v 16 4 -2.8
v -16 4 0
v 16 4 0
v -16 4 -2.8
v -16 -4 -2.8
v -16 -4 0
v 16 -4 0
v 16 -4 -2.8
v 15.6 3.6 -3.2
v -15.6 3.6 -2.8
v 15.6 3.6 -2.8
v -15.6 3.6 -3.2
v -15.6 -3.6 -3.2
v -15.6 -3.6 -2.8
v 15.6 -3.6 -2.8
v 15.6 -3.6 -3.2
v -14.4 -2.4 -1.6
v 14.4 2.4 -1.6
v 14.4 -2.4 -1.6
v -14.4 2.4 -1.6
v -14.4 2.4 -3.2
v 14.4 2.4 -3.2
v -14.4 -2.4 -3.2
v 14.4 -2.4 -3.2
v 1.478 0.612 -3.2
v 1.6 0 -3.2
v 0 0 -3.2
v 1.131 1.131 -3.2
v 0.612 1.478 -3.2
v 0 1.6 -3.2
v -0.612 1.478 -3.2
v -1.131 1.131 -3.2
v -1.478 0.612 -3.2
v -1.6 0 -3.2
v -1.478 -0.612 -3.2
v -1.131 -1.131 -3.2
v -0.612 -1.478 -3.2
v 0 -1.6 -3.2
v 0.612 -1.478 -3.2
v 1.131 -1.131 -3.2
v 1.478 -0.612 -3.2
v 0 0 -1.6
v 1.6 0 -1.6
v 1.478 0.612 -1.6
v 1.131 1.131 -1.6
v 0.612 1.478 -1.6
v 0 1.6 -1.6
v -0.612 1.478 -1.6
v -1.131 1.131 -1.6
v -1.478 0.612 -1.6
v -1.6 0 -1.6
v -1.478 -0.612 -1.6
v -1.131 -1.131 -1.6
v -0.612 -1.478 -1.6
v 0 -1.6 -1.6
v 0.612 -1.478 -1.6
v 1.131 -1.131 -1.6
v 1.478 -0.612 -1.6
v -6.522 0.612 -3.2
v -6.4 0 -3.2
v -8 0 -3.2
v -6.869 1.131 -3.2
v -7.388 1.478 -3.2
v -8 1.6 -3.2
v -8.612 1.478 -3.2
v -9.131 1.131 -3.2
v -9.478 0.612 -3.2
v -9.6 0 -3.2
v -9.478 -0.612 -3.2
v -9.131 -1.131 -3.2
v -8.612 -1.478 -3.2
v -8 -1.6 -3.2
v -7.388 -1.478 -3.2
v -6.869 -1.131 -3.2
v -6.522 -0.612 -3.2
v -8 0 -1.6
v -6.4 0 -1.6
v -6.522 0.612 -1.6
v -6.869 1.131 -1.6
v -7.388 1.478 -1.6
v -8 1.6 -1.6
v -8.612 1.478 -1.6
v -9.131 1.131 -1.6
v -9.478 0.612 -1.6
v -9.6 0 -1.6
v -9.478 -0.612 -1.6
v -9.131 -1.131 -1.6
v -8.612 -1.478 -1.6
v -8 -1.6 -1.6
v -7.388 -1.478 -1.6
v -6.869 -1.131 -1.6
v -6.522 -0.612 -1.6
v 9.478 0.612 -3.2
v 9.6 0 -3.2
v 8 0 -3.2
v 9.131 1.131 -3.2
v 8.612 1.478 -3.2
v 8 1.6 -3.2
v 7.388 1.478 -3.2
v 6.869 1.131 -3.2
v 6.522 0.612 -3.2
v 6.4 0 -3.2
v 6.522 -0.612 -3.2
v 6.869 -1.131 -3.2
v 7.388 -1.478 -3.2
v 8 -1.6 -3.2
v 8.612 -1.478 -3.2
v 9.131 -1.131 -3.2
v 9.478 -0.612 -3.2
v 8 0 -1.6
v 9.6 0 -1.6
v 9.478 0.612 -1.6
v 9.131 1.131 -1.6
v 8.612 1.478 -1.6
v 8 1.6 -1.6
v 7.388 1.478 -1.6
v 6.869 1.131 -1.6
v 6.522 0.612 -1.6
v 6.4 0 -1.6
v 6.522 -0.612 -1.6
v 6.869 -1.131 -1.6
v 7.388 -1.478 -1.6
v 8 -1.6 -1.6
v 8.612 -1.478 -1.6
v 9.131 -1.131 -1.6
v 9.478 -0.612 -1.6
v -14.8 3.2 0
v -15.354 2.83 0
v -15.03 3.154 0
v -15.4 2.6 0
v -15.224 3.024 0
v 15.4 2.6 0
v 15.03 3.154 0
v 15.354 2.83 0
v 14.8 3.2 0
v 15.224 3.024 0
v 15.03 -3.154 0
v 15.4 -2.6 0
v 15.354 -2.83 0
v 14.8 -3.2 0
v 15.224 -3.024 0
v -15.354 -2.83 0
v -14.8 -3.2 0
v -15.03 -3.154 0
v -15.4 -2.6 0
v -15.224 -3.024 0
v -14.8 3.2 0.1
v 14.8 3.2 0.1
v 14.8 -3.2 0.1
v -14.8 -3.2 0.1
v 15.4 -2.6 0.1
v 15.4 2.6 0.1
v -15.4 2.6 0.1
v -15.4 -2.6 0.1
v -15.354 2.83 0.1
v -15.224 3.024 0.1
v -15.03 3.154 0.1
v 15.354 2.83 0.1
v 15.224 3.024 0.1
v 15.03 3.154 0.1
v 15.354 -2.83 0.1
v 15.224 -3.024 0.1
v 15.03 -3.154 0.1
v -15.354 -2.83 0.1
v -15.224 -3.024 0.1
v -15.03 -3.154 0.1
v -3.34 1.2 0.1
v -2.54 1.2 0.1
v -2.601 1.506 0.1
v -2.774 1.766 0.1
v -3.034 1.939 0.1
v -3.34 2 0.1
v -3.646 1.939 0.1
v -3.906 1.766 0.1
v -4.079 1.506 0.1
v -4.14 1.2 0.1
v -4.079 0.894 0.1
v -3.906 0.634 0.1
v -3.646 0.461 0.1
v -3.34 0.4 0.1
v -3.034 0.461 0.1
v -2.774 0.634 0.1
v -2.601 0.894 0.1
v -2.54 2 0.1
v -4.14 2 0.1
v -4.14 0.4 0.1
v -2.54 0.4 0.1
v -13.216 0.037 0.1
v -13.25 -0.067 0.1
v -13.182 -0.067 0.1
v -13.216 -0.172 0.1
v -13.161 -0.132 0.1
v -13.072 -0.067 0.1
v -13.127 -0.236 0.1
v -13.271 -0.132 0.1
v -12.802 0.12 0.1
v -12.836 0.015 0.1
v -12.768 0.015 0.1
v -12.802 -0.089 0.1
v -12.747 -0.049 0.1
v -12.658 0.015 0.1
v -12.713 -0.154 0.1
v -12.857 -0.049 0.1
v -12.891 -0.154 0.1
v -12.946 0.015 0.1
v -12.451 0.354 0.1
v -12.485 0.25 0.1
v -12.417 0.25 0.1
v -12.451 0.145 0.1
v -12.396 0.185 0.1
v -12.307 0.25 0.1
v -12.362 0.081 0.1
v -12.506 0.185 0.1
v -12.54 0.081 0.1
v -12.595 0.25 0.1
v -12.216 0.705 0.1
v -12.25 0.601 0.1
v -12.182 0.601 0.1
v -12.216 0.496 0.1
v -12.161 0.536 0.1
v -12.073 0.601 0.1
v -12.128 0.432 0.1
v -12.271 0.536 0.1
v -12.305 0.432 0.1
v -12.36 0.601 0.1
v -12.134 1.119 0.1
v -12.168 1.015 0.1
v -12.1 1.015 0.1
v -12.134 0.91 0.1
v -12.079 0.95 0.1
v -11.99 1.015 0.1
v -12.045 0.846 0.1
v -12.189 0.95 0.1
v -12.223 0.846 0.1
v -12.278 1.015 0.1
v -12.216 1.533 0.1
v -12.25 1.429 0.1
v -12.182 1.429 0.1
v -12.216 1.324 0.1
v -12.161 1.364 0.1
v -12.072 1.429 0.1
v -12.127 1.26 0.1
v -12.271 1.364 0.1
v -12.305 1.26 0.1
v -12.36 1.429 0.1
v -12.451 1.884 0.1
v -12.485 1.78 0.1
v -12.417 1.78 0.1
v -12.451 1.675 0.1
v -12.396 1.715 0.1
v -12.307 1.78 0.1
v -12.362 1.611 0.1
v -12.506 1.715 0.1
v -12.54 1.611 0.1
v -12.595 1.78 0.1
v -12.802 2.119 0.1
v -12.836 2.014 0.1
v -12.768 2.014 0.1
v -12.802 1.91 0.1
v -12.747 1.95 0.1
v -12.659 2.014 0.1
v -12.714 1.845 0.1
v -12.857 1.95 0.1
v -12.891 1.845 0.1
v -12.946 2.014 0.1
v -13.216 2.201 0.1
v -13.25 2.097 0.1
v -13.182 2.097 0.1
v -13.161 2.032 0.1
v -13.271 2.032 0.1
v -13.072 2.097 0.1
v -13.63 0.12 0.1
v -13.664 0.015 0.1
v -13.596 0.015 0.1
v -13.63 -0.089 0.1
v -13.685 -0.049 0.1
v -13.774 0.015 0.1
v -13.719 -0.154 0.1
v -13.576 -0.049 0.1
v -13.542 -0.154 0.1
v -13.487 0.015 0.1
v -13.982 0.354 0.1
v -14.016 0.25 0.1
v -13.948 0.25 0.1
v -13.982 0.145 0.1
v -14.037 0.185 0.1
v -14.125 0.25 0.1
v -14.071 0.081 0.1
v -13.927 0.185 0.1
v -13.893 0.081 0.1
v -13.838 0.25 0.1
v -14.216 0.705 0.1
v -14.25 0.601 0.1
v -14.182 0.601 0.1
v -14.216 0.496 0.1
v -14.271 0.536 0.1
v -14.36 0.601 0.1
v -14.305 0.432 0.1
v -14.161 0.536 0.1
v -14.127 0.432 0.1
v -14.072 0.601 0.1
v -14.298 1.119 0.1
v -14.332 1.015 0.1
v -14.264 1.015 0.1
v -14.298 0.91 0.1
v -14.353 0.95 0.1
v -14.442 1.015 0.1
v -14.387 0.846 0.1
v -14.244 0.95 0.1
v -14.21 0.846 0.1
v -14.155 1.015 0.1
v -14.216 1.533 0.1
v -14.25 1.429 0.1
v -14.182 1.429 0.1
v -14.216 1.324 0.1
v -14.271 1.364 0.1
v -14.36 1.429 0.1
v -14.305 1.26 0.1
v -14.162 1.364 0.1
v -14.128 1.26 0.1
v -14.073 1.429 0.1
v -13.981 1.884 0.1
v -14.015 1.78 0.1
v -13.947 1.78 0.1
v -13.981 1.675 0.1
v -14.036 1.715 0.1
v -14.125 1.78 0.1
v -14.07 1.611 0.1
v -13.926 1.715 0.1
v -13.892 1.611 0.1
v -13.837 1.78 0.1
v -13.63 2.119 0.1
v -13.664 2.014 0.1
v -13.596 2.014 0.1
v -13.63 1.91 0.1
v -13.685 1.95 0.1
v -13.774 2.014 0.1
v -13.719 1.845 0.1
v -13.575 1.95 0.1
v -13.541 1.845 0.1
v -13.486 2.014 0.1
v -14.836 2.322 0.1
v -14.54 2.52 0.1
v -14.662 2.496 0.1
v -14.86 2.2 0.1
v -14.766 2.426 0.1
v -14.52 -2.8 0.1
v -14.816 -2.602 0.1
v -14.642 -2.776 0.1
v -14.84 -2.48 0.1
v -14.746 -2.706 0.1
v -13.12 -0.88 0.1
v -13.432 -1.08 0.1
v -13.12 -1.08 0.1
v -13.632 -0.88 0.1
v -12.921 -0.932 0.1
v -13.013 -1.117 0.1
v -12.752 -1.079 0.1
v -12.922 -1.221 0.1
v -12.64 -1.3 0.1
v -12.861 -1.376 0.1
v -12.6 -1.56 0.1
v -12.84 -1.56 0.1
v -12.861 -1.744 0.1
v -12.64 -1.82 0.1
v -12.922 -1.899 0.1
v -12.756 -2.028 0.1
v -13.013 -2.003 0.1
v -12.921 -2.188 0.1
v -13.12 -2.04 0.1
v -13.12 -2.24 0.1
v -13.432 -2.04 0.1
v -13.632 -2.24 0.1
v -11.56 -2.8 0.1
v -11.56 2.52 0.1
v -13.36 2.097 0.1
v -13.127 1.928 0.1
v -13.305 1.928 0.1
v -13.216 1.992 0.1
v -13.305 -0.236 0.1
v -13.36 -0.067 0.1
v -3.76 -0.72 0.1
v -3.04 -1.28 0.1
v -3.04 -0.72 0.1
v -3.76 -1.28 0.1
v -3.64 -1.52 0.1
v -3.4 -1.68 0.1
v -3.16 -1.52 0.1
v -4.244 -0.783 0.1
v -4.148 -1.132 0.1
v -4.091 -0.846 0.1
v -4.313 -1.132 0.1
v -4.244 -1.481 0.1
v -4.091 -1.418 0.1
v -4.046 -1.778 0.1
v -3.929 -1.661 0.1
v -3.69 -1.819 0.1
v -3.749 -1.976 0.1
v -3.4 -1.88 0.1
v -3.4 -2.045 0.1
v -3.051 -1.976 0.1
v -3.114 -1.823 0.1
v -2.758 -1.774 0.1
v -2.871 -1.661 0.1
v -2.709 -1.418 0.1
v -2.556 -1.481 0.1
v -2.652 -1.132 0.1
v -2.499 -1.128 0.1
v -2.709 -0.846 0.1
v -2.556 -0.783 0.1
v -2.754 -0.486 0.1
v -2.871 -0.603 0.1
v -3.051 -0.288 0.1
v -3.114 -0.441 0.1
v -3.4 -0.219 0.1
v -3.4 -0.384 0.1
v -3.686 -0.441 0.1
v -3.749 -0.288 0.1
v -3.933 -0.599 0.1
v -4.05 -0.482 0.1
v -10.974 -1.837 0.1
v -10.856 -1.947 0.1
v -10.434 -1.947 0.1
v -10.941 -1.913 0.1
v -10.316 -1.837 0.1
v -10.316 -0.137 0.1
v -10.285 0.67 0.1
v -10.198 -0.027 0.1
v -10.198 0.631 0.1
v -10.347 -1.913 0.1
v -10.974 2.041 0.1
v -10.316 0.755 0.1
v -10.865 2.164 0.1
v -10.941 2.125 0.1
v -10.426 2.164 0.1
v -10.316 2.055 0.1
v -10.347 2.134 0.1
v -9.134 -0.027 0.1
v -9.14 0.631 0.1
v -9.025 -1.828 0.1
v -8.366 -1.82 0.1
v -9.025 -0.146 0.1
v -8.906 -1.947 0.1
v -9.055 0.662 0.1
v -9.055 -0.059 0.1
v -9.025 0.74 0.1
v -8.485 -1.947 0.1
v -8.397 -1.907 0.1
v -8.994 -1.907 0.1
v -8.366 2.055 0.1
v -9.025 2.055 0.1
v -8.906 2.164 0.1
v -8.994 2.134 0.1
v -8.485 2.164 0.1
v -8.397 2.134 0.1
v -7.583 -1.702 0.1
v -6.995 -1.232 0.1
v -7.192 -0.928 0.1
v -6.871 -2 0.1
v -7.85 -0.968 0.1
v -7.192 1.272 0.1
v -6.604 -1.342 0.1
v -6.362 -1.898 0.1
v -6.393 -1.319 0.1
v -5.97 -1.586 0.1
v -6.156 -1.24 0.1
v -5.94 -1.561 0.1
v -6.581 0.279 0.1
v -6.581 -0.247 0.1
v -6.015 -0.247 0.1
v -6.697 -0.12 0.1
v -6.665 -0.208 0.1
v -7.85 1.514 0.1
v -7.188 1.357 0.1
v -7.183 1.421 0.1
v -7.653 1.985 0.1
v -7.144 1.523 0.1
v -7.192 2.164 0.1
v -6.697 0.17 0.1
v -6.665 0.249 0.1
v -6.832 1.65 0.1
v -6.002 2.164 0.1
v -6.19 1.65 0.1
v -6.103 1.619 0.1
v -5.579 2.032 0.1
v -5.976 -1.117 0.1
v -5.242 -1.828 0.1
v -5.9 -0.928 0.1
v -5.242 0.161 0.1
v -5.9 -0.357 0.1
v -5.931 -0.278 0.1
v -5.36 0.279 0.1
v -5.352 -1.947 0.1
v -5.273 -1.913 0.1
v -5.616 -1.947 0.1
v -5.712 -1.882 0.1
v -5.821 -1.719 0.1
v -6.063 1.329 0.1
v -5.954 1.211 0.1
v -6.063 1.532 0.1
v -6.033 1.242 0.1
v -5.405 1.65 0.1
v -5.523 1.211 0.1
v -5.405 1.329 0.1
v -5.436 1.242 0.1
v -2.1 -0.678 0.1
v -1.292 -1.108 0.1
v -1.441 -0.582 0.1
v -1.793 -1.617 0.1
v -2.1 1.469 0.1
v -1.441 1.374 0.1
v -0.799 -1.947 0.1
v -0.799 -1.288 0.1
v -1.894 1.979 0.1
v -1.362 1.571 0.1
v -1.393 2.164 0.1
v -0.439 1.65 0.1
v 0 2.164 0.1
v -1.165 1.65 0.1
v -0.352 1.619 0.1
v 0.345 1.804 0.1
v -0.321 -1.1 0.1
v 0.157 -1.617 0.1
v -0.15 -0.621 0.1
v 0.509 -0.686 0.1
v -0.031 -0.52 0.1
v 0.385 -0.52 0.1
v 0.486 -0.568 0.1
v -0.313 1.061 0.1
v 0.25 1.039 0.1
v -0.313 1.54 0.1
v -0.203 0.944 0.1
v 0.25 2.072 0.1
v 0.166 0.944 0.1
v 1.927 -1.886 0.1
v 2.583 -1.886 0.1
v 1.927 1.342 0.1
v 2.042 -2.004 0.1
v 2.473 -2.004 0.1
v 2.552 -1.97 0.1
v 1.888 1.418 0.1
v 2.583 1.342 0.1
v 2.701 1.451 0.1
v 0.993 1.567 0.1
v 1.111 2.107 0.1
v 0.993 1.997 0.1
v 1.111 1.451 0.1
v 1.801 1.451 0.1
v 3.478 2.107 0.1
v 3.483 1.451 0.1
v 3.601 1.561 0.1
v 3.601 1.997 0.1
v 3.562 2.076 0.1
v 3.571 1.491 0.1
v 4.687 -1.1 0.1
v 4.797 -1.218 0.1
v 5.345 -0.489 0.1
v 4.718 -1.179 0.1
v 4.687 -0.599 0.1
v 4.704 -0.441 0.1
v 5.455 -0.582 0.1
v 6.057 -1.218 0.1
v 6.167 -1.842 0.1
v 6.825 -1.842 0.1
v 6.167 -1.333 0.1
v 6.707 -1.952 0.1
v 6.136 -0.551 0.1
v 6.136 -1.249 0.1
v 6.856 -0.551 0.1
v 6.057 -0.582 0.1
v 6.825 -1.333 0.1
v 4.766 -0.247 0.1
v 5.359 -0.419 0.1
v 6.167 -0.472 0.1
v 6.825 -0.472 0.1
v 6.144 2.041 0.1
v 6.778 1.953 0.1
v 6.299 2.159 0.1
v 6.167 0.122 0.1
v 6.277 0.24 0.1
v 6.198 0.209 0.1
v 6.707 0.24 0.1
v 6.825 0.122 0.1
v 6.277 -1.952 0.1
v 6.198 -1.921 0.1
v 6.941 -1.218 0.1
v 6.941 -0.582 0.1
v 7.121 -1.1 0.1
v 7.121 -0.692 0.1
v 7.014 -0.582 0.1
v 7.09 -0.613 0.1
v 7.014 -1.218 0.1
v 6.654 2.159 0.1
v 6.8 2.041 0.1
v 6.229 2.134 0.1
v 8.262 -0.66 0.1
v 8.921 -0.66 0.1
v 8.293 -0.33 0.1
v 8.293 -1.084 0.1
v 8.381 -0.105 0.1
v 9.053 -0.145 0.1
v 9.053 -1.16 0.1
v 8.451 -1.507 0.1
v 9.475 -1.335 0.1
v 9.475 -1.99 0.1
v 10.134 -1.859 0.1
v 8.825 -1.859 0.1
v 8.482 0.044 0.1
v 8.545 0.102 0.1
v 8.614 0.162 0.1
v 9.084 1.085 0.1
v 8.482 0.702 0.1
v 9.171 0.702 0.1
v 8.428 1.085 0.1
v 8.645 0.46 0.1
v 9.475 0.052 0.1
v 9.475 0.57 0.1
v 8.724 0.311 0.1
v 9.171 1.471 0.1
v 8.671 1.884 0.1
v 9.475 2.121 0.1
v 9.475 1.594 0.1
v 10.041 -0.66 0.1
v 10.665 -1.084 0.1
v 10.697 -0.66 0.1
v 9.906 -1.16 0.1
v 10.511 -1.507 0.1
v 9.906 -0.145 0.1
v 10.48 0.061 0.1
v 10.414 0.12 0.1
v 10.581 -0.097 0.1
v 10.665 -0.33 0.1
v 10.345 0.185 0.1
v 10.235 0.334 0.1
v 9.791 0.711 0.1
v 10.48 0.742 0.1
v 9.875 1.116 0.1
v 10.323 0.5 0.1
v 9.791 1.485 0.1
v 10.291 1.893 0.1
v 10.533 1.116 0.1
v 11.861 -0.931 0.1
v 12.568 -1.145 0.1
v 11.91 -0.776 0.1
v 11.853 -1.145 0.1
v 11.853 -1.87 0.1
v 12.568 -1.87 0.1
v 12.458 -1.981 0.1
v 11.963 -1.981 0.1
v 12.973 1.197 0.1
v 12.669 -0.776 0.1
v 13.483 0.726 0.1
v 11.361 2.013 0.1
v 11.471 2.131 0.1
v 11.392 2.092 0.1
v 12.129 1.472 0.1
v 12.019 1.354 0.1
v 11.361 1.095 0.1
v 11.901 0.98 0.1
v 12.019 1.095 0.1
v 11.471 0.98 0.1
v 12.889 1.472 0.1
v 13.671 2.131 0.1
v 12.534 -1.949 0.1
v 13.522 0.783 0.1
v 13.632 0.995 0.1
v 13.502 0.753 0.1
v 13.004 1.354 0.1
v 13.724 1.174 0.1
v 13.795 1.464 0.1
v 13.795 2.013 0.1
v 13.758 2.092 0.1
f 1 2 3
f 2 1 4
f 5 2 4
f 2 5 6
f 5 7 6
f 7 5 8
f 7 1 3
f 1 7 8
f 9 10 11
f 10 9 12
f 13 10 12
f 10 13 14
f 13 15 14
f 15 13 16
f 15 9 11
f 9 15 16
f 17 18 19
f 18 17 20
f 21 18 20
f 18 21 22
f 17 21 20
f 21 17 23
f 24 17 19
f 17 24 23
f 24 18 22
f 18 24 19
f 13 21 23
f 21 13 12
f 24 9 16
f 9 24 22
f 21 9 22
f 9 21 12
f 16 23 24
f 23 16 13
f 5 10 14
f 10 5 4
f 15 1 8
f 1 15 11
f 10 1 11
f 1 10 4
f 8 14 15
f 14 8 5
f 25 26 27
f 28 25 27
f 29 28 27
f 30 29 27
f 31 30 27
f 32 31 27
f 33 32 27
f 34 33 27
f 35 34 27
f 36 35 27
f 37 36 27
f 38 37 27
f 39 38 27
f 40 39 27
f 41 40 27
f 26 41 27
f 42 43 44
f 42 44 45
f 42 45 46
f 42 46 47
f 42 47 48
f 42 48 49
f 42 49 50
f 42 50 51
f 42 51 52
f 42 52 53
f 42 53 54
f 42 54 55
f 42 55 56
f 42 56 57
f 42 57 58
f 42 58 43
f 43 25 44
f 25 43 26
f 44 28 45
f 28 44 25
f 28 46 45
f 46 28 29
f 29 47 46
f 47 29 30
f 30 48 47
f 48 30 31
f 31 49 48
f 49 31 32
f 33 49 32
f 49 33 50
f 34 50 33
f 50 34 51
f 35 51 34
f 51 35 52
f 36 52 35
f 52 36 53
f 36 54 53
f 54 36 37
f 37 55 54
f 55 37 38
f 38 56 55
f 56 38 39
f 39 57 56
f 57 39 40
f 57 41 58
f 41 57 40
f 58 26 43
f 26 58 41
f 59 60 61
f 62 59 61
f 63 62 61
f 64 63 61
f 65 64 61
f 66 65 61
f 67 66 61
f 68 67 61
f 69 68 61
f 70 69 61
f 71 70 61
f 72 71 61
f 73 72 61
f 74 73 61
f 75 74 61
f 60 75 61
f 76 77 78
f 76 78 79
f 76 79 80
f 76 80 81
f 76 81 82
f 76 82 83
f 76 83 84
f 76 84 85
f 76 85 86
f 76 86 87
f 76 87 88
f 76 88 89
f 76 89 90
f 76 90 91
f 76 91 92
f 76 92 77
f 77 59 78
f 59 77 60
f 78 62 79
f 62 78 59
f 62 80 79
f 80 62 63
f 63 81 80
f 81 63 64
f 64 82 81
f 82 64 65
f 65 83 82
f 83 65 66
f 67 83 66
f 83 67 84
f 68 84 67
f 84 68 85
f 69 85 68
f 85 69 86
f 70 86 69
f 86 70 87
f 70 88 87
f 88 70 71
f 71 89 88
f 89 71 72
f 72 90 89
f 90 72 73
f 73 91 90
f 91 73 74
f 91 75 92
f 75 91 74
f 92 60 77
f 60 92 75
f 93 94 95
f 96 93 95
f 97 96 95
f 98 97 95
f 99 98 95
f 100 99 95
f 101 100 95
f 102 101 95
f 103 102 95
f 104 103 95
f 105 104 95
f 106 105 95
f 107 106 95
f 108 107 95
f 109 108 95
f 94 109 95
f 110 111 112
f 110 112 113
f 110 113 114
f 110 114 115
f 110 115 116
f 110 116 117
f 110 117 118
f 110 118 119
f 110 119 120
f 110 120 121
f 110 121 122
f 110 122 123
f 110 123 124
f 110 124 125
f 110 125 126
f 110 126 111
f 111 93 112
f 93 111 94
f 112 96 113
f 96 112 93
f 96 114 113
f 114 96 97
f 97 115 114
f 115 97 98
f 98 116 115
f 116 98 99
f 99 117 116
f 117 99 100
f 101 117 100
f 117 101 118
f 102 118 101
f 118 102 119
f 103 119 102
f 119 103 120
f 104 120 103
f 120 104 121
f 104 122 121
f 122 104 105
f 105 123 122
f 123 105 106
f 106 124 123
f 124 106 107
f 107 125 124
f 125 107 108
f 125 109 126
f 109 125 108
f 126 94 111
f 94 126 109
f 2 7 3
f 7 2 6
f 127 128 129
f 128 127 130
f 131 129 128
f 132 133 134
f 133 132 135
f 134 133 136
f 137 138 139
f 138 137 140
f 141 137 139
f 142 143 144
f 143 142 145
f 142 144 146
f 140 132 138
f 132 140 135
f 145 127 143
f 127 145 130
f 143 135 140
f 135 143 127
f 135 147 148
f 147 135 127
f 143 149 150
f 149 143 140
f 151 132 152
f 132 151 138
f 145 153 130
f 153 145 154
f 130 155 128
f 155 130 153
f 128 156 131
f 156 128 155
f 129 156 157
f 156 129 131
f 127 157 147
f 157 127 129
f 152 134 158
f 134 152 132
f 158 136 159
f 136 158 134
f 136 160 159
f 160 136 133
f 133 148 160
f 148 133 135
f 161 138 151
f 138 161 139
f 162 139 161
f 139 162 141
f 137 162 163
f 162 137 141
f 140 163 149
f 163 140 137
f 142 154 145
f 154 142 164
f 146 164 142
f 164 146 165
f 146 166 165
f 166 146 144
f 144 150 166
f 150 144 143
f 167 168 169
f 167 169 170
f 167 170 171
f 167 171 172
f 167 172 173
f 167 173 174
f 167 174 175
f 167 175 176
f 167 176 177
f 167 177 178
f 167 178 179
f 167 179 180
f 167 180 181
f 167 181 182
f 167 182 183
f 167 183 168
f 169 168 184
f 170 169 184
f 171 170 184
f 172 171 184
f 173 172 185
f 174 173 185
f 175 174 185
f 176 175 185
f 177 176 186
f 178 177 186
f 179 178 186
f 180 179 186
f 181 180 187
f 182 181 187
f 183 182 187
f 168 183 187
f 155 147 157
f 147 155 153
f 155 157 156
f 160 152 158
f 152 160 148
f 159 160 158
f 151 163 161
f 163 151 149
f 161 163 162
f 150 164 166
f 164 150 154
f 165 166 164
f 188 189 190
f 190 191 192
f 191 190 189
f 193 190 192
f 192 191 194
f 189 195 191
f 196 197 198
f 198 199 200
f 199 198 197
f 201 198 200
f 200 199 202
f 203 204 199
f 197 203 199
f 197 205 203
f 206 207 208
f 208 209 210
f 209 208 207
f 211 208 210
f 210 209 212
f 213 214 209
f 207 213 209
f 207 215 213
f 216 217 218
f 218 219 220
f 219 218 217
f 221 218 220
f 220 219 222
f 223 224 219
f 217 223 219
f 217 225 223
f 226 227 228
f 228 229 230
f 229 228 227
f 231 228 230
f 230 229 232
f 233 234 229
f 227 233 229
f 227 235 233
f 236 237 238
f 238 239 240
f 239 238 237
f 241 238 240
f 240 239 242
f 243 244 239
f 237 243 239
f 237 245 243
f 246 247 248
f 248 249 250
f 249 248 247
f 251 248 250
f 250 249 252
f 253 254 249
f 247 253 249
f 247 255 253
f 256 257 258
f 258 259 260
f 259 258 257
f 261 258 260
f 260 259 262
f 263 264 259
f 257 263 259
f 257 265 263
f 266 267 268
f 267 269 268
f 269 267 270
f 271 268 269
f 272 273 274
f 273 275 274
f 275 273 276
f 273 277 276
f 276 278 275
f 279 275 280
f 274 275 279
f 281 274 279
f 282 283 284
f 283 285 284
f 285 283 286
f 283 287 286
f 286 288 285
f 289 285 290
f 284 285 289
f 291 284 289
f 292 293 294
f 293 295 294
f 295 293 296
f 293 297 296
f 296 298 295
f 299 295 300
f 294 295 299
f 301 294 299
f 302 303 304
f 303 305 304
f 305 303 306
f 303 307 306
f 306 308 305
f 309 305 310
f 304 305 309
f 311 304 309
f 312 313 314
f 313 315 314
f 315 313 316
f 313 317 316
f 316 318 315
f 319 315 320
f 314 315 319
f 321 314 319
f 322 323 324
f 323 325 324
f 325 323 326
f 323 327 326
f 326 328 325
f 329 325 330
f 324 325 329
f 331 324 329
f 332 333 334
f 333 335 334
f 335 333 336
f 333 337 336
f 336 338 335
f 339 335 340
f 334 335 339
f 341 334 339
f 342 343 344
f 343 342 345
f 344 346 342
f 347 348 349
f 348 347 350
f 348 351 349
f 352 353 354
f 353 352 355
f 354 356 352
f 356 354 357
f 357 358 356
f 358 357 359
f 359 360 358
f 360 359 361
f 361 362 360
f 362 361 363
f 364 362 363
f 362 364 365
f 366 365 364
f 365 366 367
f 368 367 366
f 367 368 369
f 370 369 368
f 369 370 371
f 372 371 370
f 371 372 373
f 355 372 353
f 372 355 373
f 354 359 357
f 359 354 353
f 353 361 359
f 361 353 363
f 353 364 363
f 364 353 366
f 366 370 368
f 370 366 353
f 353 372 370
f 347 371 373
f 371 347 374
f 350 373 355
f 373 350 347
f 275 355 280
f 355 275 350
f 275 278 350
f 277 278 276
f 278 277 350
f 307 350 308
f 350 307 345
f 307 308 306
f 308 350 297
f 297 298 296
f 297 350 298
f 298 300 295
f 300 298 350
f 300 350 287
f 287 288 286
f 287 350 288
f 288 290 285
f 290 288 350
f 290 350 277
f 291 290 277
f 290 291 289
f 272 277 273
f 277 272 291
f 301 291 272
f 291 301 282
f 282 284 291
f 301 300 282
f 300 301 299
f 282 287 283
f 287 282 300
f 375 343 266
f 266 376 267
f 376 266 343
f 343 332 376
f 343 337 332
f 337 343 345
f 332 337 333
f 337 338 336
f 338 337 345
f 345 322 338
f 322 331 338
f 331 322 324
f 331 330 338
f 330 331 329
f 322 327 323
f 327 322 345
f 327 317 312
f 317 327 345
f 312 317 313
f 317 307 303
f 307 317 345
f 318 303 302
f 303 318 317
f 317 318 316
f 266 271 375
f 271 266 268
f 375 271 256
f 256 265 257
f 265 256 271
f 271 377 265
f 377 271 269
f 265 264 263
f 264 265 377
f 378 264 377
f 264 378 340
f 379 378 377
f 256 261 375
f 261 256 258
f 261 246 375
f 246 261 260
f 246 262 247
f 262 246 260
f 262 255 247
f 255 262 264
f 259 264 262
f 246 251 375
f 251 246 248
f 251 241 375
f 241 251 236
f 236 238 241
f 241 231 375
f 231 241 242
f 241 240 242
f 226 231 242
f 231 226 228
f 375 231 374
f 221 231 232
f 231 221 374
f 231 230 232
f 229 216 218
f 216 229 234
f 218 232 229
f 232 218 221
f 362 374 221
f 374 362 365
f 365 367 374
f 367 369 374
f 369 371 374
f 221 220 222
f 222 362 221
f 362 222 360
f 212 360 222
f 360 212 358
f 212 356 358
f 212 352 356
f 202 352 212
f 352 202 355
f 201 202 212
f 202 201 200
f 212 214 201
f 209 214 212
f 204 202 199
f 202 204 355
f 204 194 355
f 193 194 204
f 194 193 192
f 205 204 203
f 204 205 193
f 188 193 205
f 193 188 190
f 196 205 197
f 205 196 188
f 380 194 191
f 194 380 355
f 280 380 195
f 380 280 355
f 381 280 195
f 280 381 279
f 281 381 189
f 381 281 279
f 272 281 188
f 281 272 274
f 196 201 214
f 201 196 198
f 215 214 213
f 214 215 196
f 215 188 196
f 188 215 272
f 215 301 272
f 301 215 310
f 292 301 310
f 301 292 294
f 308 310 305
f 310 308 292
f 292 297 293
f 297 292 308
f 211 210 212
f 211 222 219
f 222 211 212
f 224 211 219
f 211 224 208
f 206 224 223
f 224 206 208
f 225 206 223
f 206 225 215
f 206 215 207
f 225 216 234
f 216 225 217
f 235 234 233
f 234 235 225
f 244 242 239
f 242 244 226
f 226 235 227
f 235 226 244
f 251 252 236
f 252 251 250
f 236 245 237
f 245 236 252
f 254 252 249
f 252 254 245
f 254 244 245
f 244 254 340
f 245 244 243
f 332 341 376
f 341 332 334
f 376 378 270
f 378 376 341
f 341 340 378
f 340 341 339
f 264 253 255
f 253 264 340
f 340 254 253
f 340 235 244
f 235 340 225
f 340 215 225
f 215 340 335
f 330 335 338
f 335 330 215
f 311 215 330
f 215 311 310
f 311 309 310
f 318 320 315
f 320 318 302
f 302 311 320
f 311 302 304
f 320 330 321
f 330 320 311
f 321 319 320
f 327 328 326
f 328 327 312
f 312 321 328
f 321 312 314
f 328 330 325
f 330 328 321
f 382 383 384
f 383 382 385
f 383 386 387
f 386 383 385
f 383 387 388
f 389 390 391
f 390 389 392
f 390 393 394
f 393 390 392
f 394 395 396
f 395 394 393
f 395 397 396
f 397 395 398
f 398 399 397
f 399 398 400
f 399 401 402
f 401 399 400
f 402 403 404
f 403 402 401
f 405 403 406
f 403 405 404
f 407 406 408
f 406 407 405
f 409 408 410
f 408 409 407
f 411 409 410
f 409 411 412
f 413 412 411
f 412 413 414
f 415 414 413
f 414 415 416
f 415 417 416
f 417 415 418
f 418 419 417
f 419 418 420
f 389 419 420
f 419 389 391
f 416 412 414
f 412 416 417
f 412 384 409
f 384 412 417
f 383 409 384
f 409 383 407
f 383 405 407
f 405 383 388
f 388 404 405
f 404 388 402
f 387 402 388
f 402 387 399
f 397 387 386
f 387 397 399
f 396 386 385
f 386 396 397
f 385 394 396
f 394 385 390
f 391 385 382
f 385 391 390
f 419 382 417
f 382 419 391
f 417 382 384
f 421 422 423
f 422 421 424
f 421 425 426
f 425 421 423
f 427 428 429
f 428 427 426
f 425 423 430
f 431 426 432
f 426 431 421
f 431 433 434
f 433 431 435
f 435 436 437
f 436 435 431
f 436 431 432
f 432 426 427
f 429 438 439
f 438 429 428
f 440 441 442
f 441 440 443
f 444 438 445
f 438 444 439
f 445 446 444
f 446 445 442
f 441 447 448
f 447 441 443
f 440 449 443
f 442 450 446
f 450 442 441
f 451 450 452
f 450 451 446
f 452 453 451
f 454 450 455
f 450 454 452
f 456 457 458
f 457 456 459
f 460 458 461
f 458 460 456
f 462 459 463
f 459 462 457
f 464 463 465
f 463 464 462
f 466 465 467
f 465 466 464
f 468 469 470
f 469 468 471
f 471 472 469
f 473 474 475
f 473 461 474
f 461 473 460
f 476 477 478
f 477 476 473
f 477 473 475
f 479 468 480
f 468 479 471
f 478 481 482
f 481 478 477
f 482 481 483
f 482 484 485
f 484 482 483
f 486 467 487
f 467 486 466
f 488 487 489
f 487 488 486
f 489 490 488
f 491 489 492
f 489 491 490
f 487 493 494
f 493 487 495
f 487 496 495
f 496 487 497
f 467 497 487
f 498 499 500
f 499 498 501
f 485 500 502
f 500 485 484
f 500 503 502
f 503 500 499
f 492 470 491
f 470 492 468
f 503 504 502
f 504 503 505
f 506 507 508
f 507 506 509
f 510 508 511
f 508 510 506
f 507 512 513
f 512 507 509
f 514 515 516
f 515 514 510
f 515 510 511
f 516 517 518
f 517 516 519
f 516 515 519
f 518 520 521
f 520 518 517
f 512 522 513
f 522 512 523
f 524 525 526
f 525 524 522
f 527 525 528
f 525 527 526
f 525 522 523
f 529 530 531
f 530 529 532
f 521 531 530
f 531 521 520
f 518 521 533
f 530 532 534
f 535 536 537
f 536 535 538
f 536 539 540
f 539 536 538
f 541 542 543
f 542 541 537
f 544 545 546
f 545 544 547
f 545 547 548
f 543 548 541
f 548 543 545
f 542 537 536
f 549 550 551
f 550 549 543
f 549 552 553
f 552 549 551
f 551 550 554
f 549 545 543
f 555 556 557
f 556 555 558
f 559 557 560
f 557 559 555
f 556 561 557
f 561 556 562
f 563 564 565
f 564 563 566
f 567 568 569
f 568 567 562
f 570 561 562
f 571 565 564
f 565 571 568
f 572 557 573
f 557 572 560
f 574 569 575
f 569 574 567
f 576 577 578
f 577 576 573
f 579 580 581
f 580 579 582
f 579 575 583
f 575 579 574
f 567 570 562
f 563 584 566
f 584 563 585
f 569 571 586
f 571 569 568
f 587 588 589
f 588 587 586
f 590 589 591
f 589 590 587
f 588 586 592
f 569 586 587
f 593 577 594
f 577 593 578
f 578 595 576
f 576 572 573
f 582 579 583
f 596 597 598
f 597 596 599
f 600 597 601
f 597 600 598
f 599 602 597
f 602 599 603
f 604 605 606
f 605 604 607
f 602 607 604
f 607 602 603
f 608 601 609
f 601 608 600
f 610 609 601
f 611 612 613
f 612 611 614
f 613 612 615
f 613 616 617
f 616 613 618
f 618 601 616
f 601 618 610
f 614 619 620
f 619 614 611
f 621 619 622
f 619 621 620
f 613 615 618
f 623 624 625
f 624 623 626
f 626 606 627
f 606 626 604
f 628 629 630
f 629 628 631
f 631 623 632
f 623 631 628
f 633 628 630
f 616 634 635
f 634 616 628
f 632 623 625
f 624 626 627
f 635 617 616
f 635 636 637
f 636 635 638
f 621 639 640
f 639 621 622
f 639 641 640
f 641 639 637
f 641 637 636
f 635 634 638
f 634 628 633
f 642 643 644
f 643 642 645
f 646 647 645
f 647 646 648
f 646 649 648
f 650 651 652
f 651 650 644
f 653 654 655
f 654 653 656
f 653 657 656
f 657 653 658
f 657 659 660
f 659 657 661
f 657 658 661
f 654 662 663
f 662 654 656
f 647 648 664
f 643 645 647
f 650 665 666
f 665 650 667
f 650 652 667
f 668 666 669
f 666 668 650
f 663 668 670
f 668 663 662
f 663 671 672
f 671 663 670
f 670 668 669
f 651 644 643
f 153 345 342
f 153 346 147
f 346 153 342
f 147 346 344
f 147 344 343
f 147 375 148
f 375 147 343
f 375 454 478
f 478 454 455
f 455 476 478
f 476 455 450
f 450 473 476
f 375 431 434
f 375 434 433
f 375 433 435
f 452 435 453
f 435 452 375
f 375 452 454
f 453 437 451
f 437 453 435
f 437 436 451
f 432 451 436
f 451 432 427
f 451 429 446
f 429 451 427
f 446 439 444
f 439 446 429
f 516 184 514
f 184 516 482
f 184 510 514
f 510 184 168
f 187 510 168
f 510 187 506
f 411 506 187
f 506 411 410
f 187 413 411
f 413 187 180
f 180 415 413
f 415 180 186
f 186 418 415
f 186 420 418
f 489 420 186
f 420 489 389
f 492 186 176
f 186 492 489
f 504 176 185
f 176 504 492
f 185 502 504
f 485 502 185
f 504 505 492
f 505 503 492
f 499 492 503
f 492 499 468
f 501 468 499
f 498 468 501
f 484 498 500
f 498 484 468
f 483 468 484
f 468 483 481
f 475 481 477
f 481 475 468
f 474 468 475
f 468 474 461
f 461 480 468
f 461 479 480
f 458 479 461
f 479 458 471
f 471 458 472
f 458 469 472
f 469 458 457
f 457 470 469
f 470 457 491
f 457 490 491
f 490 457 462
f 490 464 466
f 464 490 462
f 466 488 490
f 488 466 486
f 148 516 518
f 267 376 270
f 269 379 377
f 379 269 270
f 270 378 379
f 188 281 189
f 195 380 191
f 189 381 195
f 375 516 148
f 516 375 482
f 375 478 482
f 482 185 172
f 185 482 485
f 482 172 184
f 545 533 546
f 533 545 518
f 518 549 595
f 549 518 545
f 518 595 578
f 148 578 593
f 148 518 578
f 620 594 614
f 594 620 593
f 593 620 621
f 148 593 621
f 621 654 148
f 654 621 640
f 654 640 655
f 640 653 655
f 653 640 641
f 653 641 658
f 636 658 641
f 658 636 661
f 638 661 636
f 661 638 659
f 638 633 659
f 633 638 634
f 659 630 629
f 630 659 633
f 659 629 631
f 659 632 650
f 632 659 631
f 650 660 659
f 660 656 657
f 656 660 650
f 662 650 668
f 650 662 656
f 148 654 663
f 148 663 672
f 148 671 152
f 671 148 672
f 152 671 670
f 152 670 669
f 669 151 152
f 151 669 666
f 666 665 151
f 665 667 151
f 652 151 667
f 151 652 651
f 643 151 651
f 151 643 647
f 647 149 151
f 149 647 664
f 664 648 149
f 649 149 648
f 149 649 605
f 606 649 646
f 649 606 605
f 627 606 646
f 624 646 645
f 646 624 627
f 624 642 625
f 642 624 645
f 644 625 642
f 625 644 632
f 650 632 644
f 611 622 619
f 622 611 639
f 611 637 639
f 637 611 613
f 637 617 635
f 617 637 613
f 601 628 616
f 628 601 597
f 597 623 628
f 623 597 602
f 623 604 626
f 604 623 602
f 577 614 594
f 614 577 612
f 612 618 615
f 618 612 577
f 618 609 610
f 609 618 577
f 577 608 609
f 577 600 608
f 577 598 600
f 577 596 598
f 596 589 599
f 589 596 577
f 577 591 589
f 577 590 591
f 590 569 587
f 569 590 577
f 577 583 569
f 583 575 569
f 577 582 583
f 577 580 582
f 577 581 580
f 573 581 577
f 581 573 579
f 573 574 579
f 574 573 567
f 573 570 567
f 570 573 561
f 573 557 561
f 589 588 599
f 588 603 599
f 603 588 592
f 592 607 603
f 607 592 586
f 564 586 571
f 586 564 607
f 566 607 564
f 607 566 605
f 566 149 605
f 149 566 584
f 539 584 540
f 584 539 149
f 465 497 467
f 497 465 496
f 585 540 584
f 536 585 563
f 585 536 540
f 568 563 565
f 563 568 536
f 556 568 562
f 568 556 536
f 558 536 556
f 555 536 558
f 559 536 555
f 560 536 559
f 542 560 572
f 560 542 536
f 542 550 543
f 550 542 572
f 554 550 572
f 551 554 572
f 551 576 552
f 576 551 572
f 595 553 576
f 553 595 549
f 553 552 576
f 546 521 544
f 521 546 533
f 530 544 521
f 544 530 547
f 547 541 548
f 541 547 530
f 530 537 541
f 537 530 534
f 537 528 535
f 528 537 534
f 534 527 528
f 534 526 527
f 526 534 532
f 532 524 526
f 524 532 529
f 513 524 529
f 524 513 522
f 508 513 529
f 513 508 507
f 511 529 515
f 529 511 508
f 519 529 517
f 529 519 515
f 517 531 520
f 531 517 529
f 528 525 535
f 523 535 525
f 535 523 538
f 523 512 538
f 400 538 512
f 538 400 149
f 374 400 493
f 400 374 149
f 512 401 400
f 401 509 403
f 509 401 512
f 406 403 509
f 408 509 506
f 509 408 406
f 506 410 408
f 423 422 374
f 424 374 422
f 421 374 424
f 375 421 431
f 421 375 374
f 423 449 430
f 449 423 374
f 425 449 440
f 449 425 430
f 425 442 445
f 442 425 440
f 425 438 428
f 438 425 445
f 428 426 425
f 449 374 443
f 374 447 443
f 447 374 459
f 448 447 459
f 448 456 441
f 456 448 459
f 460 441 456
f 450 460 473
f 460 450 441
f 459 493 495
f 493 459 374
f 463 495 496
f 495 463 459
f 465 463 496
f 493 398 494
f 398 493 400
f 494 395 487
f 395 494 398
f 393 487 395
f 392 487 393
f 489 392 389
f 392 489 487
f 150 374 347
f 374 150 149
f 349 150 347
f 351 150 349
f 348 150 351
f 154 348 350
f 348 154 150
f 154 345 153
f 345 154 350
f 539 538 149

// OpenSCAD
use <../lib.scad>
use <2431.scad>
use <6062886e.scad>
function ldraw_lib__2431d09() = [
// 0 Tile 1 x 4 with "HG CT 487" German Numberplate Sticker
// 0 Name: 2431d09.dat
// 0 Author: Evert-Jan Boer [ejboer]
// 0 !LDRAW_ORG Shortcut UPDATE 2024-08
// 0 !LICENSE Licensed under CC BY 4.0 : see CAreadme.txt
// 
// 0 BFC CERTIFY CCW
  [0,"BFC","CERTIFY"],
  [0,"BFC","CCW"],
// 
// 0 !CATEGORY Sticker Shortcut
// 0 !KEYWORDS Bricklink 2431pb613, Mini Cooper, set 10242
// 
// 0 !HISTORY 2024-09-30 [OrionP] Official Update 2024-08
// 
// 1 16 0 0 0 1 0 0 0 1 0 0 0 1 2431.dat
  [1,16,0,0,0,1,0,0,0,1,0,0,0,1, ldraw_lib__2431()],
// 1 16 0 0 0 1 0 0 0 1 0 0 0 1 6062886e.dat
  [1,16,0,0,0,1,0,0,0,1,0,0,0,1, ldraw_lib__6062886e()],
];
module ldraw_lib__2431d09(step=0, col=false, unit=2/5, alt=false, line=0.2, solid=!$preview)
    makepoly(ldraw_lib__2431d09(), step=step, col=col, unit=unit, alt=alt, line=line, solid=solid);
ldraw_lib__2431d09(line=0.2);
